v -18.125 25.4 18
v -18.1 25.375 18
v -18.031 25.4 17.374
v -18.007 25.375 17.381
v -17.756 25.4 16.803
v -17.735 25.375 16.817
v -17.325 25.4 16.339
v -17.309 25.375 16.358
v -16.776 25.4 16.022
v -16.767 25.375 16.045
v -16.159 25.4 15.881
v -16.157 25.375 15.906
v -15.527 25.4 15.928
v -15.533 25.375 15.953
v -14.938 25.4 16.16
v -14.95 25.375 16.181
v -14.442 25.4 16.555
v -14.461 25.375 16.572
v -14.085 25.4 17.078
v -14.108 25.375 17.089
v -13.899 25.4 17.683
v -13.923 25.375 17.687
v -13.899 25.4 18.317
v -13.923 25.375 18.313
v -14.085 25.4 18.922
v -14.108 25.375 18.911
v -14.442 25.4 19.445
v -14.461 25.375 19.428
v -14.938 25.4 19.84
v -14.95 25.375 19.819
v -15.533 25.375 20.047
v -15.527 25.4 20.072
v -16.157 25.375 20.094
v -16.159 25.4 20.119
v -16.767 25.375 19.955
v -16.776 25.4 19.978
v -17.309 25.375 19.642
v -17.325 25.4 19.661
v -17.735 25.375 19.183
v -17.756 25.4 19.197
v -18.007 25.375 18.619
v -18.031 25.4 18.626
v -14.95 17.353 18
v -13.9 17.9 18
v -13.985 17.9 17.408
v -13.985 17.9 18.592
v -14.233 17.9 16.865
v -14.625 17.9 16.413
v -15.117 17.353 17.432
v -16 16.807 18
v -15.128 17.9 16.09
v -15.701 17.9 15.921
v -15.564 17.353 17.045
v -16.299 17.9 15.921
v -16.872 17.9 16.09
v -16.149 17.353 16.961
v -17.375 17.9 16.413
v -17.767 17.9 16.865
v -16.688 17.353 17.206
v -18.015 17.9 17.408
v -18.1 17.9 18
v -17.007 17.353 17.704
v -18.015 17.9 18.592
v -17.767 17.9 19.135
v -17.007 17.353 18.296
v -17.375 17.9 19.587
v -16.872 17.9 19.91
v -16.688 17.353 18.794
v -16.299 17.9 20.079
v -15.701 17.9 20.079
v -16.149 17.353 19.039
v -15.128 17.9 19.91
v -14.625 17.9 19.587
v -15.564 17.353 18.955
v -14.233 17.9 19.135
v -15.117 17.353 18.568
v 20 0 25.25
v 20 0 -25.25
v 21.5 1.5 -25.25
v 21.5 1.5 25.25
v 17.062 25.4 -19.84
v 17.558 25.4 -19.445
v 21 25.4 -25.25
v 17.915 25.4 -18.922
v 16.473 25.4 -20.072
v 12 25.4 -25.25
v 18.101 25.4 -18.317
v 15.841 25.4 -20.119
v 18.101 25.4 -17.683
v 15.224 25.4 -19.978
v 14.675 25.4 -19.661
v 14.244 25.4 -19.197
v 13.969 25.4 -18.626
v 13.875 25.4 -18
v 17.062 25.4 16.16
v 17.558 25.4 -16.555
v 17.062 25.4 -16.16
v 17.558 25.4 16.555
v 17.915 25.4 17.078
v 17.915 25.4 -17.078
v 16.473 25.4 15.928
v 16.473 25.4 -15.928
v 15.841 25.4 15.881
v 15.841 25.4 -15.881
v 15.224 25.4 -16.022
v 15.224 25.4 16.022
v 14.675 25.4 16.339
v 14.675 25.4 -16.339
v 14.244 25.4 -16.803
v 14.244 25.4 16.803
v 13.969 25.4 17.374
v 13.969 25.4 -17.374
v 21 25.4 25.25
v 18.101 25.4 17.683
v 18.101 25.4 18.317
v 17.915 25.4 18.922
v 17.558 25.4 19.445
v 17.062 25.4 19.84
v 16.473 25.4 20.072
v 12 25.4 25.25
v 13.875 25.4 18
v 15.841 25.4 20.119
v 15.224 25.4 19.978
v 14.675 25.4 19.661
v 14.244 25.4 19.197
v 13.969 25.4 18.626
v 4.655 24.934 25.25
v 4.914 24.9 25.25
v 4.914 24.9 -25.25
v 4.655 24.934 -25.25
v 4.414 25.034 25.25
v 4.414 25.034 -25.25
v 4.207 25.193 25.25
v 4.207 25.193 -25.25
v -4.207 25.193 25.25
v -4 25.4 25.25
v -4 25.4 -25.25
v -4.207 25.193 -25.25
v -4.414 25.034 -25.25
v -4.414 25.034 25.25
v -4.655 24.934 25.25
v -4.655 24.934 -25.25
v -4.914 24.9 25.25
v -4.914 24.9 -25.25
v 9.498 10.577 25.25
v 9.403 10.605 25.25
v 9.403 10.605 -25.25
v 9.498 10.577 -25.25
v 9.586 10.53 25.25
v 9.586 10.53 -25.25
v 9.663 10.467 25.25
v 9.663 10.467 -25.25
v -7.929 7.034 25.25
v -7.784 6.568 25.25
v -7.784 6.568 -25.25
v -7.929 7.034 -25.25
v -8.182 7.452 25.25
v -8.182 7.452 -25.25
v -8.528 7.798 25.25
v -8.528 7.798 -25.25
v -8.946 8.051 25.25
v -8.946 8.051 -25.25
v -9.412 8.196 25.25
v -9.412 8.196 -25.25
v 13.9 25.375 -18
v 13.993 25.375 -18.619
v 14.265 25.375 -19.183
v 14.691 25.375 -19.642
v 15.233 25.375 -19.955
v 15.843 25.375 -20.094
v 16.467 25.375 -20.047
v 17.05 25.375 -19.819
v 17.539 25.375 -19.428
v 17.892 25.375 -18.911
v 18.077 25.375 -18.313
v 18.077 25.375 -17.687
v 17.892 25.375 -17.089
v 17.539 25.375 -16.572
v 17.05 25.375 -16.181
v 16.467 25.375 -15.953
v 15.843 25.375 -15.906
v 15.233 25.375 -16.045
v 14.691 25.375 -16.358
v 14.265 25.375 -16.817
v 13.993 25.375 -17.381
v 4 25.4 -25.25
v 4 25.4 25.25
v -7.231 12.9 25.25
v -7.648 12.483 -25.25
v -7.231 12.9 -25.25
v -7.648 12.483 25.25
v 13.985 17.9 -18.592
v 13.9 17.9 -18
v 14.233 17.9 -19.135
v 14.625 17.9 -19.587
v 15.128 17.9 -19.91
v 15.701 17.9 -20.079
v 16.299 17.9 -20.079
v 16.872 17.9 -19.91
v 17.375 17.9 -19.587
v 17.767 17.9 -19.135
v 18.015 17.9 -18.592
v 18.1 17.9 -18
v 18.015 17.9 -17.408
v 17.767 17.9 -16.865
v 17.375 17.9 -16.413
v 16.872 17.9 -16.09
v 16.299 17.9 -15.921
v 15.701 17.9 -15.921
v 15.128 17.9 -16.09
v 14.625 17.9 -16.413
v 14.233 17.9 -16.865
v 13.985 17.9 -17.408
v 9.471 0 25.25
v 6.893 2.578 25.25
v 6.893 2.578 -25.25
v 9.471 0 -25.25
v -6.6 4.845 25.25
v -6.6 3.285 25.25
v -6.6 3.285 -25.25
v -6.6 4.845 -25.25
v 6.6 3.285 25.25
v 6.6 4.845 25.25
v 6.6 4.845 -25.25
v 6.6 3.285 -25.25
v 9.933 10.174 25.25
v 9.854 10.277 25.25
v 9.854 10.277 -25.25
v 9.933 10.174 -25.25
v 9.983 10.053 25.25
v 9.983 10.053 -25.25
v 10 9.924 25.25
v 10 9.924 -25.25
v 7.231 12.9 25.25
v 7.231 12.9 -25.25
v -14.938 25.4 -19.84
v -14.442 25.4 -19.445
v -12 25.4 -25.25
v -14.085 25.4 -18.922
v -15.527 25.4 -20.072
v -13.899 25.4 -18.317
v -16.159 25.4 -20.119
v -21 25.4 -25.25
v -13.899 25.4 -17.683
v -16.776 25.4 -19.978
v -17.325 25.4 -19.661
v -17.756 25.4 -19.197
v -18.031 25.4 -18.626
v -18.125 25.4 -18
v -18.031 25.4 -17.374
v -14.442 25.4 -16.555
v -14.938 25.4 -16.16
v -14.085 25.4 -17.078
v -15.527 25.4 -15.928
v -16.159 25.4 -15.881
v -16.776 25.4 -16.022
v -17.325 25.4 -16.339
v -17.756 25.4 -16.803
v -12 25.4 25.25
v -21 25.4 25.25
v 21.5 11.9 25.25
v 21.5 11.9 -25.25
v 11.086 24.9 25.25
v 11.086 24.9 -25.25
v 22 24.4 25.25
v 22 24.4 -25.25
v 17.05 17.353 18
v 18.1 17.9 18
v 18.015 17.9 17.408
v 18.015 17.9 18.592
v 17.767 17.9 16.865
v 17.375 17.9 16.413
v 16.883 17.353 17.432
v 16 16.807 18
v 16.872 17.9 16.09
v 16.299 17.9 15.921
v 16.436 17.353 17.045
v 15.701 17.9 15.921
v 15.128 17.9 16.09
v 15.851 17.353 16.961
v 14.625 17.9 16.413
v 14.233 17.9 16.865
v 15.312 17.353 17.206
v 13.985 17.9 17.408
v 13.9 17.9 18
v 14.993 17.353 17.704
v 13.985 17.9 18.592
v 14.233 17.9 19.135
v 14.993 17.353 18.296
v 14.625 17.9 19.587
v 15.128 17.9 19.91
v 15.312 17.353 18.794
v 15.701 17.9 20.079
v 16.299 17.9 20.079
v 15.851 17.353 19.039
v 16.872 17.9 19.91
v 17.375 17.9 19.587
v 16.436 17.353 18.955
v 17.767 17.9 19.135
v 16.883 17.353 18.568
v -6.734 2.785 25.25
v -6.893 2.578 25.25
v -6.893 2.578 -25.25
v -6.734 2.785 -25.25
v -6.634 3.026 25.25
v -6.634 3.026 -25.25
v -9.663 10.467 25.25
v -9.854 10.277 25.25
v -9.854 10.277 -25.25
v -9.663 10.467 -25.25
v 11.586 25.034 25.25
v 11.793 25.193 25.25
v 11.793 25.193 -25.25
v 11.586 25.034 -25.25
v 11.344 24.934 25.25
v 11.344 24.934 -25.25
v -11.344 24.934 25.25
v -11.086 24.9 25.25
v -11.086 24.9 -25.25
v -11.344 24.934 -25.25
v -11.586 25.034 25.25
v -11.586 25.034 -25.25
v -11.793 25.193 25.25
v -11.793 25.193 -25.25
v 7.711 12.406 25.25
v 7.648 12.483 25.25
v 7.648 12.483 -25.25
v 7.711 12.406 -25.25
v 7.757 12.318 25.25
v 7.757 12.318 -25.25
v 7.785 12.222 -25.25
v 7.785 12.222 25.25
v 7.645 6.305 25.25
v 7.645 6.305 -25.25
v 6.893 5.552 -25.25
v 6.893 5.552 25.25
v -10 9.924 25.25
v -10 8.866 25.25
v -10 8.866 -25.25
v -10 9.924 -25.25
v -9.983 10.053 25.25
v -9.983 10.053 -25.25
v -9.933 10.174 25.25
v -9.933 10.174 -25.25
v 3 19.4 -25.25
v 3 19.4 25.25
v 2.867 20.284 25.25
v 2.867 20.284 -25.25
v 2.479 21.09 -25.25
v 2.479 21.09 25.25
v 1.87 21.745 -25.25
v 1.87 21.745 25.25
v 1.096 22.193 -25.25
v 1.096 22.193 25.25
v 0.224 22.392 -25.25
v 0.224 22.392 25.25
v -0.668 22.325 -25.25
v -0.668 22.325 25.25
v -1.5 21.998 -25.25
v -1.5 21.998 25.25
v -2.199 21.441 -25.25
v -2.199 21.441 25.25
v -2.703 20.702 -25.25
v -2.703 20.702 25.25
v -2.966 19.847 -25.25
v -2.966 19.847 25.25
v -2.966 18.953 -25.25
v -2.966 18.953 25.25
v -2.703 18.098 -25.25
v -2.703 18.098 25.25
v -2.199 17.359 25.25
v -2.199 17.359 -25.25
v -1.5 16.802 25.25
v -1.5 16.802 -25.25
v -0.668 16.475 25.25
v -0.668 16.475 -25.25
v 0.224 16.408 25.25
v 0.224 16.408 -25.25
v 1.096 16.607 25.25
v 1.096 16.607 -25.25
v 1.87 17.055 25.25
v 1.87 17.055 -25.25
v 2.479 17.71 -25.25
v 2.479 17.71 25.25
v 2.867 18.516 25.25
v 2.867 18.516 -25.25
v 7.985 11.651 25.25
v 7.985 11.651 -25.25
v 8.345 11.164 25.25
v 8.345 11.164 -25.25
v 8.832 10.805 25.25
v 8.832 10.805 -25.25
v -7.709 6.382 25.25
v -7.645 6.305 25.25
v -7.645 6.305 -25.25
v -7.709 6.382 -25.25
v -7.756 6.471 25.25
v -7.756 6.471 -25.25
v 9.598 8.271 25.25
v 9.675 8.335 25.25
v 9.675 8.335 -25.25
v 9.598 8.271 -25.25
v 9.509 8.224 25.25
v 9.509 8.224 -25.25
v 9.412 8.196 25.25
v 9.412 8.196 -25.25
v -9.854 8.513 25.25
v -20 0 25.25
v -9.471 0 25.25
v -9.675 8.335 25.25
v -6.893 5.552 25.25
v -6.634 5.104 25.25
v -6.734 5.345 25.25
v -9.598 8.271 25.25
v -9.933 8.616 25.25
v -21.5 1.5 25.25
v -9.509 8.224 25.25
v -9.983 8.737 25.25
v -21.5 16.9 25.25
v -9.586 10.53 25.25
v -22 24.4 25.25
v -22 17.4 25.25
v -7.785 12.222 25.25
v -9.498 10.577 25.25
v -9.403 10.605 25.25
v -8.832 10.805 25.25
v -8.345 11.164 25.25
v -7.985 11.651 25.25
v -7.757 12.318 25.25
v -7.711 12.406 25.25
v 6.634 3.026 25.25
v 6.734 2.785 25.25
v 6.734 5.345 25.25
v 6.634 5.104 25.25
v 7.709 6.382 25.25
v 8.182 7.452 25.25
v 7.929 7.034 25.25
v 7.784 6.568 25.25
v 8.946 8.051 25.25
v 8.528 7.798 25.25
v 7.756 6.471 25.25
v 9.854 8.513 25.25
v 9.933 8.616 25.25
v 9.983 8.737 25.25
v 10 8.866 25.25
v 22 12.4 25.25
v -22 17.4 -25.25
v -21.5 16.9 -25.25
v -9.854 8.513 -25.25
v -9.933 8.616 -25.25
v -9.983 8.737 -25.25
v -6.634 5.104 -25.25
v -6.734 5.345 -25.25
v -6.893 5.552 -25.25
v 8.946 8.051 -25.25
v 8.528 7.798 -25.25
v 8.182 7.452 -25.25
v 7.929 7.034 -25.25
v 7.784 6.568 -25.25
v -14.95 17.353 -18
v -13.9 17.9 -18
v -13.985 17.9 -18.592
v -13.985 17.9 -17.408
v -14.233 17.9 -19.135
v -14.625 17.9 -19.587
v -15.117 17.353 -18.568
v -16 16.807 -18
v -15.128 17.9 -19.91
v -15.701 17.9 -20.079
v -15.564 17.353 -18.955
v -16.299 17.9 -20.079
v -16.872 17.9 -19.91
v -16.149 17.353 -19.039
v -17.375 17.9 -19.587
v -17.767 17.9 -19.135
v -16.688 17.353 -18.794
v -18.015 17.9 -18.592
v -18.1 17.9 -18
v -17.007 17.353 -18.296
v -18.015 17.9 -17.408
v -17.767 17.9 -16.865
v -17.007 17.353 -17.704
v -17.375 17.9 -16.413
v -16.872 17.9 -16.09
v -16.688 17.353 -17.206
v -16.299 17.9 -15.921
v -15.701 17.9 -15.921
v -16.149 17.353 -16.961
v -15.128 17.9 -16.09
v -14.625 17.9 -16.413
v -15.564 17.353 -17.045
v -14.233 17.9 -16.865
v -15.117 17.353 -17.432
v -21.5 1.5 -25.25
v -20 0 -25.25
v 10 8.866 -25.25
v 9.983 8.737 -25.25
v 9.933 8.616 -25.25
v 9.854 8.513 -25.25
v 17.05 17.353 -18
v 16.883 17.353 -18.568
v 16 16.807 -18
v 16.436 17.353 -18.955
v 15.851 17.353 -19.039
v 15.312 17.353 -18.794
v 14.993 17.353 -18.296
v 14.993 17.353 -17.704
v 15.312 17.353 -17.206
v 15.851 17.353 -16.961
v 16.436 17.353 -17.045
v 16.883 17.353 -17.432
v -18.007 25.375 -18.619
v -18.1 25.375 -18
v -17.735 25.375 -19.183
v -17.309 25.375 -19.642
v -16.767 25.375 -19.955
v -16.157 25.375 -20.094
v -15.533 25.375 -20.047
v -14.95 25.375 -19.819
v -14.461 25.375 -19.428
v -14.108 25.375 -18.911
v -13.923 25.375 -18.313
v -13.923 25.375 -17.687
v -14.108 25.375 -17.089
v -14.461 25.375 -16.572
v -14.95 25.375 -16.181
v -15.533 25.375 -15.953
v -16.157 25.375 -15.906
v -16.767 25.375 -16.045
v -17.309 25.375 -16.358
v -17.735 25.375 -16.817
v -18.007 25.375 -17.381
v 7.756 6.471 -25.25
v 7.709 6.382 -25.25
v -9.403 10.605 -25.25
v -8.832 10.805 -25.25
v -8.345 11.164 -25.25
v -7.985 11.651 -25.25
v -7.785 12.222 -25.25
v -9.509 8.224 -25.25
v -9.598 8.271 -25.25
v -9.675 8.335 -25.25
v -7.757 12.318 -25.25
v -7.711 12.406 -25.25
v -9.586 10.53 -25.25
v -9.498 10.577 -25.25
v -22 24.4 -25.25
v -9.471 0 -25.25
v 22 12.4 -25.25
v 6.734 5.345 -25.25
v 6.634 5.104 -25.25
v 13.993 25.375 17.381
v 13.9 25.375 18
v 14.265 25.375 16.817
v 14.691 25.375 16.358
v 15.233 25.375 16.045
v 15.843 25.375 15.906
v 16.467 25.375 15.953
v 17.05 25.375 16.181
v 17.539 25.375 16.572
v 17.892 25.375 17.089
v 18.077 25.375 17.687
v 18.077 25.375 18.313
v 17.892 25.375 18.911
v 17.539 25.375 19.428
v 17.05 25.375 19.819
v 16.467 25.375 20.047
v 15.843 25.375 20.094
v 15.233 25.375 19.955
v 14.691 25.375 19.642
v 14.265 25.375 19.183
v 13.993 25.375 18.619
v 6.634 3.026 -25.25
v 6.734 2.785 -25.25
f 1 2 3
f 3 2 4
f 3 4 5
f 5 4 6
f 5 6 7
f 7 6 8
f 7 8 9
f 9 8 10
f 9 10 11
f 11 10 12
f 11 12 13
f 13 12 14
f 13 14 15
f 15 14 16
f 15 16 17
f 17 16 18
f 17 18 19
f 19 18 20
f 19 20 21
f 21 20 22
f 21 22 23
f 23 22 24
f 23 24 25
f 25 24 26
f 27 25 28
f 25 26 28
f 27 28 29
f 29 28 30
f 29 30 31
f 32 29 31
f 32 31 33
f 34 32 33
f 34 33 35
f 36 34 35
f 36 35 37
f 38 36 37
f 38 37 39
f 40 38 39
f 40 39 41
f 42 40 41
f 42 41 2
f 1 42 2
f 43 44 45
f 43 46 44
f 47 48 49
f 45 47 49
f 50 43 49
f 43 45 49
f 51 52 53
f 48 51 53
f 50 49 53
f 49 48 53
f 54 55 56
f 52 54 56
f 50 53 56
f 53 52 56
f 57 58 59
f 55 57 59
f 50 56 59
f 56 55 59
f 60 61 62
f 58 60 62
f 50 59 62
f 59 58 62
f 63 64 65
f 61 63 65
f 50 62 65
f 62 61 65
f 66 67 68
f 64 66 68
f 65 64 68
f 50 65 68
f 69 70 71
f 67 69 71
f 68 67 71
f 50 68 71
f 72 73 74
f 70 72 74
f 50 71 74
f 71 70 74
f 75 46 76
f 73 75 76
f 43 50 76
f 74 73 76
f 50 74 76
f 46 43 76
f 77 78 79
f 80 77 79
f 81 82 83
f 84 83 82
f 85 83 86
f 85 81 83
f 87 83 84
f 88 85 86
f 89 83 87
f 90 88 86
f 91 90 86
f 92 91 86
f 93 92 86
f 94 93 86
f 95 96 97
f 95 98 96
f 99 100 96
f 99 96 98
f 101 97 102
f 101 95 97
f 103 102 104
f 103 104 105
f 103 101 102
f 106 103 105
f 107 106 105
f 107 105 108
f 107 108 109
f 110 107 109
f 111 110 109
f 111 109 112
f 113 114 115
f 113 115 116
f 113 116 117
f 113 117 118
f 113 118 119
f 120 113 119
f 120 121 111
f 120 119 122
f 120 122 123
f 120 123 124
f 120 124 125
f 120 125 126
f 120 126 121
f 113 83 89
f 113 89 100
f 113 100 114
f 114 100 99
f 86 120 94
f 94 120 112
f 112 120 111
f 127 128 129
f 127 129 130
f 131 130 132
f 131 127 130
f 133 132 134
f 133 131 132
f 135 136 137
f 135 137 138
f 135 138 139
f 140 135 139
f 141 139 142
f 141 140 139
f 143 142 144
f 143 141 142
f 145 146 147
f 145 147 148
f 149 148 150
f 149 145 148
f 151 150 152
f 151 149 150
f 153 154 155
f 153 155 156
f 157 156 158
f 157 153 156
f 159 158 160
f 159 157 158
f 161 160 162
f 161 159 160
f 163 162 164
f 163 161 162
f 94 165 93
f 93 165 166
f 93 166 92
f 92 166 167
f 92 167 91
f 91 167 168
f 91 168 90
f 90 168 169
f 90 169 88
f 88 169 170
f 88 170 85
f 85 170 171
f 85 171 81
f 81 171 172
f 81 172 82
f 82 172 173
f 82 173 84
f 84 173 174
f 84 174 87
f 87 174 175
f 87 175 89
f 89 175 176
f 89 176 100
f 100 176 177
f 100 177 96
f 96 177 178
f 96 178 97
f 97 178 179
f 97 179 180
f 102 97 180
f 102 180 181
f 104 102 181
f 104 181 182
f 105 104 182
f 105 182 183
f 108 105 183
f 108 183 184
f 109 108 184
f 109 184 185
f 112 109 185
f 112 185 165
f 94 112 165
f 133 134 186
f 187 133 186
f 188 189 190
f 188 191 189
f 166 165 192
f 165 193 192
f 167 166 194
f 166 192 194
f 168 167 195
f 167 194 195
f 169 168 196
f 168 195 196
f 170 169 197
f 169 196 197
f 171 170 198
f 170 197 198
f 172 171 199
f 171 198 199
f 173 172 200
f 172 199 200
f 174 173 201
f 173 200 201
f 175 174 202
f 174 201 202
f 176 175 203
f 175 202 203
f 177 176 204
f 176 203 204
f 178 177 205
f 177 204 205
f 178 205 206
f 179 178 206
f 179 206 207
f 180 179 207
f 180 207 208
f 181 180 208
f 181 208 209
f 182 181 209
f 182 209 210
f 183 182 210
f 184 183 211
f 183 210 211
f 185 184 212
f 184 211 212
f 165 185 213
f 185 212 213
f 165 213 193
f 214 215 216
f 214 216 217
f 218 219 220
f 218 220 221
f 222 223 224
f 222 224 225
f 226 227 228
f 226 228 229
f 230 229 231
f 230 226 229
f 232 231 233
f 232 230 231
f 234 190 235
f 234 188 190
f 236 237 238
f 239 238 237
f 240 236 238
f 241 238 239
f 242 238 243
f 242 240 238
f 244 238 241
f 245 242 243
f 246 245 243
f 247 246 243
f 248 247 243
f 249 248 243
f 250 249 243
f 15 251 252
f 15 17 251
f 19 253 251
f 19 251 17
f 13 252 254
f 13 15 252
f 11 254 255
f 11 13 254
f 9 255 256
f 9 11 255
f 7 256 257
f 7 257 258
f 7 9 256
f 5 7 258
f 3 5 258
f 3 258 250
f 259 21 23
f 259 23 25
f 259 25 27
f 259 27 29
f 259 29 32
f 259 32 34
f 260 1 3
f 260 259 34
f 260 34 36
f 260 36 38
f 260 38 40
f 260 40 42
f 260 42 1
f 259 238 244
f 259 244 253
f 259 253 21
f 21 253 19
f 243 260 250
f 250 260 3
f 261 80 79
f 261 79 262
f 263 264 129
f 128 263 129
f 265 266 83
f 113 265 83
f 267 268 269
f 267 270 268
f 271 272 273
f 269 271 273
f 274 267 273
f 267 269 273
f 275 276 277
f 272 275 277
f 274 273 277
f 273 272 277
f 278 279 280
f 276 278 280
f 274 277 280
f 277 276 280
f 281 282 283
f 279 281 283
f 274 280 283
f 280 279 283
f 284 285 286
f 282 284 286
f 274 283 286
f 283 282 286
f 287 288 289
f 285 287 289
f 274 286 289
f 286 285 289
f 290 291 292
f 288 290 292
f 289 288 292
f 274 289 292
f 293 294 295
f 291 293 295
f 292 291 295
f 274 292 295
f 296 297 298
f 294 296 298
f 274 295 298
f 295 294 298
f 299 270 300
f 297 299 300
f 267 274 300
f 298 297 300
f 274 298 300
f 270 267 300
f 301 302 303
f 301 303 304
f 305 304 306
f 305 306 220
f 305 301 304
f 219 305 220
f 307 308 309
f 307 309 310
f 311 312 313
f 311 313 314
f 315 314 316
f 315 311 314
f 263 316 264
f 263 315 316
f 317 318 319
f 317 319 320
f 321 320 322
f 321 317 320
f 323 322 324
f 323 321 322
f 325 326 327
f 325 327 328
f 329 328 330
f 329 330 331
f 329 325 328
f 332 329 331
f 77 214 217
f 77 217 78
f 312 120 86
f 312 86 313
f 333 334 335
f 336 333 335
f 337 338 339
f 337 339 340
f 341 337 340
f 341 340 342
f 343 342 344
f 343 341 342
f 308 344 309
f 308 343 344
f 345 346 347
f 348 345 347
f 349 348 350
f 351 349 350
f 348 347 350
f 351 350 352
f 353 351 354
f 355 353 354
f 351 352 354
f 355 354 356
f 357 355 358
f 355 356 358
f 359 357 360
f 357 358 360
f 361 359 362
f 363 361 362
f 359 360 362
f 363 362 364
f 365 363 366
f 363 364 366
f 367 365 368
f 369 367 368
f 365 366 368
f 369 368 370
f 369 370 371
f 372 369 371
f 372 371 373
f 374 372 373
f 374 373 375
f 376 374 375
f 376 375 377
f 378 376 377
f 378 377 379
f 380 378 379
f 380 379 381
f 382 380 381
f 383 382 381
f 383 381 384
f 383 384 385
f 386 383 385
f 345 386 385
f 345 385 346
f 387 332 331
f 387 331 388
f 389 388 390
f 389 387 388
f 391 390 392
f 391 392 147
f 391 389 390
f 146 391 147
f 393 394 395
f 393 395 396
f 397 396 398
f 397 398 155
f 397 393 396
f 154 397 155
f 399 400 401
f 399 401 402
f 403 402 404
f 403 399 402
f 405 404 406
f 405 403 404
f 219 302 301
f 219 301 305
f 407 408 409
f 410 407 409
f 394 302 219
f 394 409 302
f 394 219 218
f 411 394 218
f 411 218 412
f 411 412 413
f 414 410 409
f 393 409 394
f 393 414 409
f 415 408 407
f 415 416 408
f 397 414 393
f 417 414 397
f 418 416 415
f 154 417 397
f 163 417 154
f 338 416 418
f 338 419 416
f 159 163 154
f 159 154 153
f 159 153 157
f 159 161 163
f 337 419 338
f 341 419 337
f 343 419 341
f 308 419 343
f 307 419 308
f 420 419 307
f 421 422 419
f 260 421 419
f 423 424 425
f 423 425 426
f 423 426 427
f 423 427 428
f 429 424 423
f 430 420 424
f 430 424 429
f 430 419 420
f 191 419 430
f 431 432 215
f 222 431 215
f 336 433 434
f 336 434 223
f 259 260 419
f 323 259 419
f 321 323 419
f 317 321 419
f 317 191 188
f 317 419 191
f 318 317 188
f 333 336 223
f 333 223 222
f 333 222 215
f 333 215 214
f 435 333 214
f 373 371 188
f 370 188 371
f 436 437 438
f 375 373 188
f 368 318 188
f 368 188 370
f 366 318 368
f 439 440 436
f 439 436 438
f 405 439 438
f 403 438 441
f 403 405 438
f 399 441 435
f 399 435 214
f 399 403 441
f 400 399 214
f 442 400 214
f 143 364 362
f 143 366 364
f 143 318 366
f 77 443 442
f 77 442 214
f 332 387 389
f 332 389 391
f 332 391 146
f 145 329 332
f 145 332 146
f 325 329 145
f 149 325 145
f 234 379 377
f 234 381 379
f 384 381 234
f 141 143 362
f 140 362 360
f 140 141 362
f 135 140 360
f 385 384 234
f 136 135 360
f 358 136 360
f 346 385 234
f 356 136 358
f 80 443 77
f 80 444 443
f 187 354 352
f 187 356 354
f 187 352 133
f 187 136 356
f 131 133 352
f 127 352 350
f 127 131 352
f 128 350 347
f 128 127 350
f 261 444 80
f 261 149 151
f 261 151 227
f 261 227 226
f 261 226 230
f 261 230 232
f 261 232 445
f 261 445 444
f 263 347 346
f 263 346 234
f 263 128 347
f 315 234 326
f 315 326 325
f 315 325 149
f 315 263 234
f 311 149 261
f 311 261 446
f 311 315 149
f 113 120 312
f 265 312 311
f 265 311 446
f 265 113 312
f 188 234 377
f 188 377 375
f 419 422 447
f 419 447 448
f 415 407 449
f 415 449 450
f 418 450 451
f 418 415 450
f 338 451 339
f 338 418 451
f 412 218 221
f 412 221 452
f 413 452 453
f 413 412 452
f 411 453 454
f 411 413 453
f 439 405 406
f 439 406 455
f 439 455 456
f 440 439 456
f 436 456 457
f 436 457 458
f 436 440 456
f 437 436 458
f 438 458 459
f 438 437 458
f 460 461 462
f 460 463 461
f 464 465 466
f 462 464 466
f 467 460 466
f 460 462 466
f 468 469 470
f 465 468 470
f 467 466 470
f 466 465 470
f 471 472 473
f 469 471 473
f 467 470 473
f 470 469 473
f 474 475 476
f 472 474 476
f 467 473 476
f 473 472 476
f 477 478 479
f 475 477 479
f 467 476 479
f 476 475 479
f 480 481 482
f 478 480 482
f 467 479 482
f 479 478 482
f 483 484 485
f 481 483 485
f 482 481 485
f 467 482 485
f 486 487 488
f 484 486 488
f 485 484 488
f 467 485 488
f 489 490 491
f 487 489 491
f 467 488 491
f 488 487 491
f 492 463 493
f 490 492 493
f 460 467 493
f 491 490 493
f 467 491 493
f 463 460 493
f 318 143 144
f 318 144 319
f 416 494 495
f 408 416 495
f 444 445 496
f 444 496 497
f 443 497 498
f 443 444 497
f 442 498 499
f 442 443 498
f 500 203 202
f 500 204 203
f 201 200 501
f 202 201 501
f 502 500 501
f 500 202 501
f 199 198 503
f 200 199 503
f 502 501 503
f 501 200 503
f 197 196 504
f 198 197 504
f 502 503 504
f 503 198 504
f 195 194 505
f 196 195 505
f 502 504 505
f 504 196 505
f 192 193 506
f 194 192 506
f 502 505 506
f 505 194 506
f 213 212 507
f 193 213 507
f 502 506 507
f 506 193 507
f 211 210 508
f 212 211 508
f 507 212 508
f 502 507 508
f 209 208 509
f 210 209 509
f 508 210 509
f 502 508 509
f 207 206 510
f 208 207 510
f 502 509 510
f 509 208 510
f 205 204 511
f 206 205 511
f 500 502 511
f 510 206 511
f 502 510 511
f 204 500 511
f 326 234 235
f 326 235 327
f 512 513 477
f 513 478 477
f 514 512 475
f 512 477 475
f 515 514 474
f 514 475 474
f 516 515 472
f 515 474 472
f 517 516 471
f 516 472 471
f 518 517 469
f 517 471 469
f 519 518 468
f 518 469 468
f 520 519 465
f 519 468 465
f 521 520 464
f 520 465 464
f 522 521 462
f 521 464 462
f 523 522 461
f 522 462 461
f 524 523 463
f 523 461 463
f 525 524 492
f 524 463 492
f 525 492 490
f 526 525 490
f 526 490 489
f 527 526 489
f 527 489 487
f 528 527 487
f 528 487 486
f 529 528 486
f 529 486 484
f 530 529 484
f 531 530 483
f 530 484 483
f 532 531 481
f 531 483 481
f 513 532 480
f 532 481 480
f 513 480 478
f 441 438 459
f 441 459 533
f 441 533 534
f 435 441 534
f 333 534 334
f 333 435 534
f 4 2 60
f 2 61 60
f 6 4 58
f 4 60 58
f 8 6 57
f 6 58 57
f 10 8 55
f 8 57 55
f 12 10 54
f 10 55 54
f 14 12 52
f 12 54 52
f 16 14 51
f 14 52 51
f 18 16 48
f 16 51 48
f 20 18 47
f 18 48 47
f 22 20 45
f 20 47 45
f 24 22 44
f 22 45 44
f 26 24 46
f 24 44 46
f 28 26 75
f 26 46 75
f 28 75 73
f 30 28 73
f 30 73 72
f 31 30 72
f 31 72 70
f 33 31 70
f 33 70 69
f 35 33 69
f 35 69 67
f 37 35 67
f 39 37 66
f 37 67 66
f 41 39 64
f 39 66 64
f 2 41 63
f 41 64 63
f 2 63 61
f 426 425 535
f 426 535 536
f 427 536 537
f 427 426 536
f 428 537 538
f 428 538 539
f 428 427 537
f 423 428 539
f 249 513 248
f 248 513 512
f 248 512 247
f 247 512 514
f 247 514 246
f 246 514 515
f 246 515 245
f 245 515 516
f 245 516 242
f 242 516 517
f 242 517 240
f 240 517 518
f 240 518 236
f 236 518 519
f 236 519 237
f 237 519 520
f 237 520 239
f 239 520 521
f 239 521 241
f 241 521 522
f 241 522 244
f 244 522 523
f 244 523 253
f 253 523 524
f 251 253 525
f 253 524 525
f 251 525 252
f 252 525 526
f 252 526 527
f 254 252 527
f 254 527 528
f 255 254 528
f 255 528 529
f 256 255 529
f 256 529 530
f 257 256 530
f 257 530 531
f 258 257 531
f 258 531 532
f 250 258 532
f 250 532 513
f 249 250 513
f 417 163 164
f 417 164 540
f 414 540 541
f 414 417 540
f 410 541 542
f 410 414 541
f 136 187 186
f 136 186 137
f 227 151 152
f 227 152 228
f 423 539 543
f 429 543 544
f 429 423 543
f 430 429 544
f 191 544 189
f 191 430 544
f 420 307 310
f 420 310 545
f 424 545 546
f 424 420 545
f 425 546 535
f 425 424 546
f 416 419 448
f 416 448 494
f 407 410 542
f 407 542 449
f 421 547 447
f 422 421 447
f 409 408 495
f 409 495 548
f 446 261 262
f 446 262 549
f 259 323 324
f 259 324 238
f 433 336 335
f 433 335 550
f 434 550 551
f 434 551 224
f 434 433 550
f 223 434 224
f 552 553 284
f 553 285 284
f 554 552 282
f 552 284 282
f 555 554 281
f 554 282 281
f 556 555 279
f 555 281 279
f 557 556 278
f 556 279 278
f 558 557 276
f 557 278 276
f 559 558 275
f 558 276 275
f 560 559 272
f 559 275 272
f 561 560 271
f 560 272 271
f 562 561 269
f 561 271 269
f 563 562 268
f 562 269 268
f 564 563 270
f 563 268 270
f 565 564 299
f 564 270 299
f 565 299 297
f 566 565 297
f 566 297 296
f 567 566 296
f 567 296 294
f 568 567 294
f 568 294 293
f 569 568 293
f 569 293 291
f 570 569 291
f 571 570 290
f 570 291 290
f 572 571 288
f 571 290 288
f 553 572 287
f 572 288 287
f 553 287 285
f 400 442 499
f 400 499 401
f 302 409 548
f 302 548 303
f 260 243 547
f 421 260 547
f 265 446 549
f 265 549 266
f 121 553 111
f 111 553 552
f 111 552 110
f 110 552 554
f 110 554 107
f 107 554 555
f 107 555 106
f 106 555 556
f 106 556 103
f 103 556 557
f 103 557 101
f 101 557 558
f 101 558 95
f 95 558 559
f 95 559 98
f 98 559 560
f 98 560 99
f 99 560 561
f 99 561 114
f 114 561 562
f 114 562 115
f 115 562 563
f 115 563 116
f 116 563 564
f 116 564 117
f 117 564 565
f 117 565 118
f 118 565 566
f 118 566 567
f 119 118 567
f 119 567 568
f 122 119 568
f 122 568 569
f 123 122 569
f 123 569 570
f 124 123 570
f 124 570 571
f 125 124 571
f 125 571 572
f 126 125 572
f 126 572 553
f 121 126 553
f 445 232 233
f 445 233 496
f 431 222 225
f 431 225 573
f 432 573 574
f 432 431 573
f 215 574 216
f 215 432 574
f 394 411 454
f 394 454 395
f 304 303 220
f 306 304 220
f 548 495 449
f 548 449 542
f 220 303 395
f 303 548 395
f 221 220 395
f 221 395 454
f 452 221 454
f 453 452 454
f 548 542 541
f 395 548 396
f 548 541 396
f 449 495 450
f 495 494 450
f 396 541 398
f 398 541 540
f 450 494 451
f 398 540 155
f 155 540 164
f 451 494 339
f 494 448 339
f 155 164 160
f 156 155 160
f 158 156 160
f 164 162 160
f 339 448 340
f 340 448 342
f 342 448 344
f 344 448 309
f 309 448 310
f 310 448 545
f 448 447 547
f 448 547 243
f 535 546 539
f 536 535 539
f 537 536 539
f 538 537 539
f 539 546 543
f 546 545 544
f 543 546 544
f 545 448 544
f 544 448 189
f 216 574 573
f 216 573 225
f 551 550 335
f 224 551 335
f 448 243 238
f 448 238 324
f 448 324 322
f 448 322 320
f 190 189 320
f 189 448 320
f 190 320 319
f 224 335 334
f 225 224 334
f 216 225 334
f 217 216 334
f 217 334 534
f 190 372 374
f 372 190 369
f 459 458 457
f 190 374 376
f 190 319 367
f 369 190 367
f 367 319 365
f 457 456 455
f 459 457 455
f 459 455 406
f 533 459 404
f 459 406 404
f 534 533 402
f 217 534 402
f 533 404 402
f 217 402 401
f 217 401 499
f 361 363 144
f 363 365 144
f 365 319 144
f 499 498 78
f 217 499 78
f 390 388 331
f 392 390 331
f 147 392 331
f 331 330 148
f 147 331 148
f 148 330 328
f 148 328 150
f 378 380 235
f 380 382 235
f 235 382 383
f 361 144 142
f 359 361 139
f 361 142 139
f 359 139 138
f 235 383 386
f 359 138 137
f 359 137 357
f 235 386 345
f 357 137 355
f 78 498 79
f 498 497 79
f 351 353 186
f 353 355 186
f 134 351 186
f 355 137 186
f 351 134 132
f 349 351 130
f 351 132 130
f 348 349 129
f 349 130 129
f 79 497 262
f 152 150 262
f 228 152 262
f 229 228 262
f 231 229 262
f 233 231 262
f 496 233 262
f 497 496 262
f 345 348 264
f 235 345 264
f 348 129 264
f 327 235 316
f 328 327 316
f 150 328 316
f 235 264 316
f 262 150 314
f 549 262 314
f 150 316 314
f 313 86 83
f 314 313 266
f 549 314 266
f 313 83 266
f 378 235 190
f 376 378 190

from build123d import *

# Parameters (mm, degrees)
BLOCK_DEPTH                           = 25.25
TAP_DRILL_FOR_M5X0_8_TAP1_D           = 4.2
TAP_DRILL_FOR_M5X0_8_TAP1_DEPTH       = 7.5
TAP_DRILL_FOR_M5X0_8_TAP1_CSINK_D     = 4.25
TAP_DRILL_FOR_M5X0_8_TAP1_CSINK_ANGLE = 90
TAP_DRILL_FOR_M5X0_8_TAP1_TIP         = 1.093190806
F_6_0_6_DIAMETER_HOLE1_D              = 6


with BuildPart() as part:
    # Sketch2 → Block (new, symmetric)
    with BuildSketch(Plane.XY):
        with BuildLine():
            Line((-7.230720611, 12.9), (7.230720611, 12.9))
            Line((7.230720611, 12.9), (7.647672674, 12.483047938))
            ThreePointArc((7.647672674, 12.483047938), (7.736182466, 12.363118479), (7.785406885, 12.222427275))
            ThreePointArc((7.785406885, 12.222427275), (8.344607784, 11.164307384), (9.402727675, 10.605106485))
            ThreePointArc((9.402727675, 10.605106485), (9.54341888, 10.555882066), (9.663348338, 10.467372274))
            Line((9.663348338, 10.467372274), (9.853553391, 10.277167221))
            ThreePointArc((9.853553391, 10.277167221), (9.961939766, 10.114955546), (10, 9.92361383))
            Line((10, 9.92361383), (10, 8.86638617))
            ThreePointArc((10, 8.86638617), (9.961939766, 8.675044454), (9.853553391, 8.512832779))
            Line((9.853553391, 8.512832779), (9.675343394, 8.334622782))
            ThreePointArc((9.675343394, 8.334622782), (9.554347216, 8.245550888), (9.412352167, 8.19644607))
            ThreePointArc((9.412352167, 8.19644607), (8.344607784, 7.635448616), (7.783610331, 6.567704234))
            ThreePointArc((7.783610331, 6.567704234), (7.734505512, 6.425709184), (7.645433618, 6.304713007))
            Line((7.645433618, 6.304713007), (6.892893219, 5.552172608))
            ThreePointArc((6.892893219, 5.552172608), (6.676120468, 5.227749259), (6.6, 4.845065826))
            Line((6.6, 4.845065826), (6.6, 3.284934173))
            ThreePointArc((6.6, 3.284934173), (6.676120468, 2.902250741), (6.892893219, 2.577827392))
            Line((6.892893219, 2.577827392), (9.470720611, 0))
            Line((9.470720611, 0), (19.9998779, 0))
            Line((19.9998779, 0), (21.5001221, 1.5))
            Line((21.5001221, 1.5), (21.5001221, 11.9))
            Line((21.5001221, 11.9), (22, 12.3997558))
            Line((22, 12.3997558), (22, 24.4))
            Line((22, 24.4), (20.9998779, 25.4))
            Line((20.9998779, 25.4), (11.9998779, 25.4))
            Line((11.9998779, 25.4), (11.792771119, 25.192893219))
            ThreePointArc((11.792771119, 25.192893219), (11.46834777, 24.976120467), (11.085664338, 24.9))
            Line((11.085664338, 24.9), (4.914091462, 24.9))
            ThreePointArc((4.914091462, 24.9), (4.53140803, 24.976120467), (4.206984681, 25.192893219))
            Line((4.206984681, 25.192893219), (4.0001221, 25.4))
            Line((4.0001221, 25.4), (-3.9998779, 25.4))
            Line((-3.9998779, 25.4), (-4.206984681, 25.192893219))
            ThreePointArc((-4.206984681, 25.192893219), (-4.53140803, 24.976120467), (-4.914091462, 24.9))
            Line((-4.914091462, 24.9), (-11.085664338, 24.9))
            ThreePointArc((-11.085664338, 24.9), (-11.46834777, 24.976120467), (-11.792771119, 25.192893219))
            Line((-11.792771119, 25.192893219), (-11.9998779, 25.4))
            Line((-11.9998779, 25.4), (-20.9998779, 25.4))
            Line((-20.9998779, 25.4), (-22, 24.4))
            Line((-22, 24.4), (-22, 17.4))
            Line((-22, 17.4), (-21.5001221, 16.9002442))
            Line((-21.5001221, 16.9002442), (-21.5001221, 1.5))
            Line((-21.5001221, 1.5), (-19.9998779, 0))
            Line((-19.9998779, 0), (-9.470720611, 0))
            Line((-9.470720611, 0), (-6.892893219, 2.577827392))
            ThreePointArc((-6.892893219, 2.577827392), (-6.676120468, 2.902250741), (-6.6, 3.284934173))
            Line((-6.6, 3.284934173), (-6.6, 4.845065826))
            ThreePointArc((-6.6, 4.845065826), (-6.676120468, 5.227749259), (-6.892893219, 5.552172608))
            Line((-6.892893219, 5.552172608), (-7.645433618, 6.304713006))
            ThreePointArc((-7.645433618, 6.304713006), (-7.734505512, 6.425709184), (-7.783610331, 6.567704233))
            ThreePointArc((-7.783610331, 6.567704233), (-8.344607784, 7.635448616), (-9.412352167, 8.19644607))
            ThreePointArc((-9.412352167, 8.19644607), (-9.554347216, 8.245550888), (-9.675343394, 8.334622782))
            Line((-9.675343394, 8.334622782), (-9.853553391, 8.512832779))
            ThreePointArc((-9.853553391, 8.512832779), (-9.961939766, 8.675044454), (-10, 8.86638617))
            Line((-10, 8.86638617), (-10, 9.92361383))
            ThreePointArc((-10, 9.92361383), (-9.961939766, 10.114955546), (-9.853553391, 10.277167221))
            Line((-9.853553391, 10.277167221), (-9.663348338, 10.467372274))
            ThreePointArc((-9.663348338, 10.467372274), (-9.543418879, 10.555882066), (-9.402727675, 10.605106485))
            ThreePointArc((-9.402727675, 10.605106485), (-8.344607784, 11.164307384), (-7.785406885, 12.222427275))
            ThreePointArc((-7.785406885, 12.222427275), (-7.736182466, 12.363118479), (-7.647672674, 12.483047938))
            Line((-7.647672674, 12.483047938), (-7.230720611, 12.9))
        make_face()
    extrude(amount=BLOCK_DEPTH, both=True)

    # Tap Drill for M5x0.8 Tap1
    with Locations(Plane(origin=(0, 25.4, 0), x_dir=(1, 0, 0), z_dir=(0, 1, 0))):
        with Locations((16, 18), (-16, 18), (16, -18), (-16, -18)):
            CounterSinkHole(TAP_DRILL_FOR_M5X0_8_TAP1_D / 2, TAP_DRILL_FOR_M5X0_8_TAP1_CSINK_D / 2, depth=TAP_DRILL_FOR_M5X0_8_TAP1_DEPTH, counter_sink_angle=TAP_DRILL_FOR_M5X0_8_TAP1_CSINK_ANGLE)
            with Locations((0, 0, -(TAP_DRILL_FOR_M5X0_8_TAP1_DEPTH + TAP_DRILL_FOR_M5X0_8_TAP1_TIP / 2))):  # 125° drill point
                Cone(0, TAP_DRILL_FOR_M5X0_8_TAP1_D / 2, TAP_DRILL_FOR_M5X0_8_TAP1_TIP, mode=Mode.SUBTRACT)

    # Ø6.0 (6) Diameter Hole1 (through all)
    with Locations(Plane(origin=(0, 0, -25.25), x_dir=(-1, 0, 0), z_dir=(0, 0, -1))):
        with Locations((0, 19.4)):
            Hole(F_6_0_6_DIAMETER_HOLE1_D / 2)


solid = part.part
